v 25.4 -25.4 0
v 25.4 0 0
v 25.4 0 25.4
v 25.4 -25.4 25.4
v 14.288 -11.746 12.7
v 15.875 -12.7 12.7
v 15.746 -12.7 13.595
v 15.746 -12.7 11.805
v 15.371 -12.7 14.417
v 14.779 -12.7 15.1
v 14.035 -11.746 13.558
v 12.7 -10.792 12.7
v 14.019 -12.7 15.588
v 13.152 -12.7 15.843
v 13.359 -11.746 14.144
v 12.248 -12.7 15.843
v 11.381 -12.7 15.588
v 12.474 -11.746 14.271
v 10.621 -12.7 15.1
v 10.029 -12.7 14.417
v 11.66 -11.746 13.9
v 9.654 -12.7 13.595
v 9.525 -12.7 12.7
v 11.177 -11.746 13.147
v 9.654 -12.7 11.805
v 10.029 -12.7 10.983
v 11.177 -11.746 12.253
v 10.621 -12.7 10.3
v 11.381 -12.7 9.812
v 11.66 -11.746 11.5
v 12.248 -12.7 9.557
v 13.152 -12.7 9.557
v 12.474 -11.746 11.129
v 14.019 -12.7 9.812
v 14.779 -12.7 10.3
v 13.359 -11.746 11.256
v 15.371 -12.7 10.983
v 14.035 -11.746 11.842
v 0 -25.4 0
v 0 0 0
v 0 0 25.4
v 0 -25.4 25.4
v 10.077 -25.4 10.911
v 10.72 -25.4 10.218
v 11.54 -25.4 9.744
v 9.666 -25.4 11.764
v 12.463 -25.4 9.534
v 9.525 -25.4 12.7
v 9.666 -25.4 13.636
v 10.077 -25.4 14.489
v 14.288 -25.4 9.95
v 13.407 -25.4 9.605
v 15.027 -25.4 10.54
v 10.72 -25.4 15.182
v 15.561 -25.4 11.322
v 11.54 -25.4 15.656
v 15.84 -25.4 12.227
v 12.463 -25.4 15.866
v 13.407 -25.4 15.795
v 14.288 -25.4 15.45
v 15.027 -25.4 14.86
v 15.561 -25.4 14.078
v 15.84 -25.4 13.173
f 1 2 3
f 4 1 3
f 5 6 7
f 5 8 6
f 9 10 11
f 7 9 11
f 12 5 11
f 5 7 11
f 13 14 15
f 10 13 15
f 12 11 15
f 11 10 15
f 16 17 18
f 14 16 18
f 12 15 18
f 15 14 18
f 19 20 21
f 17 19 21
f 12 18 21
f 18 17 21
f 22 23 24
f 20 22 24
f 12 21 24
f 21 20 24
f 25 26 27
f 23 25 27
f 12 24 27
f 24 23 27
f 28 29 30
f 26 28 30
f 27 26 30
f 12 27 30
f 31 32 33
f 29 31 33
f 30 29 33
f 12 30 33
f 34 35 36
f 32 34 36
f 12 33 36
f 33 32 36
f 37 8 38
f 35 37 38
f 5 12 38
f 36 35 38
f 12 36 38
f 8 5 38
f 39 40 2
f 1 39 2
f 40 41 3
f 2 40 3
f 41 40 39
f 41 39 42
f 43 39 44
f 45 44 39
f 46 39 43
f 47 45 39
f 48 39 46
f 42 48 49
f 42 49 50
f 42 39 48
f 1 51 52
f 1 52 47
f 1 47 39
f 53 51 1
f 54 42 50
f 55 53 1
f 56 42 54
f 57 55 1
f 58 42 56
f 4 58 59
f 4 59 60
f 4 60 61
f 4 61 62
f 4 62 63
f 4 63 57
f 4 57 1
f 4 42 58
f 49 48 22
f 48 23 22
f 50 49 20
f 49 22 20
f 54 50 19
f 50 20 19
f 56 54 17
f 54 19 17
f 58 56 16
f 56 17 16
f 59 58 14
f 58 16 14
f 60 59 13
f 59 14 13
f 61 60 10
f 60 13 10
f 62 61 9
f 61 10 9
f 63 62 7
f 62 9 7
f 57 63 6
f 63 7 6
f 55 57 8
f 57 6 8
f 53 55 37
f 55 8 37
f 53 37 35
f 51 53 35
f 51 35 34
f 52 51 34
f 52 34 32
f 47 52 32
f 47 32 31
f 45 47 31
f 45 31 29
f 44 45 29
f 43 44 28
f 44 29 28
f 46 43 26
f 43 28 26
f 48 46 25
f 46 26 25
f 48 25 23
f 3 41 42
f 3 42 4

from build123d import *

# Parameters (mm, degrees)
F0_W     = 25.4
F0_H     = 25.4
F1_DEPTH = 25.4
F3_D     = 6.35
F3_DEPTH = 12.7
F3_TIP   = 1.9077324654


with BuildPart() as f1:
    # F0 (on Front) → F1 (new body)
    with BuildSketch(Plane.XZ):
        with Locations((12.7, 12.7)):
            Rectangle(F0_W, F0_H)
    extrude(amount=F1_DEPTH)

    # F3
    with Locations(Plane.XZ.offset(25.4)):
        with Locations((12.7, 12.7)):
            Hole(F3_D / 2, depth=F3_DEPTH)
            with Locations((0, 0, -(F3_DEPTH + F3_TIP / 2))):  # 118° drill point
                Cone(0, F3_D / 2, F3_TIP, mode=Mode.SUBTRACT)


solid = f1.part
